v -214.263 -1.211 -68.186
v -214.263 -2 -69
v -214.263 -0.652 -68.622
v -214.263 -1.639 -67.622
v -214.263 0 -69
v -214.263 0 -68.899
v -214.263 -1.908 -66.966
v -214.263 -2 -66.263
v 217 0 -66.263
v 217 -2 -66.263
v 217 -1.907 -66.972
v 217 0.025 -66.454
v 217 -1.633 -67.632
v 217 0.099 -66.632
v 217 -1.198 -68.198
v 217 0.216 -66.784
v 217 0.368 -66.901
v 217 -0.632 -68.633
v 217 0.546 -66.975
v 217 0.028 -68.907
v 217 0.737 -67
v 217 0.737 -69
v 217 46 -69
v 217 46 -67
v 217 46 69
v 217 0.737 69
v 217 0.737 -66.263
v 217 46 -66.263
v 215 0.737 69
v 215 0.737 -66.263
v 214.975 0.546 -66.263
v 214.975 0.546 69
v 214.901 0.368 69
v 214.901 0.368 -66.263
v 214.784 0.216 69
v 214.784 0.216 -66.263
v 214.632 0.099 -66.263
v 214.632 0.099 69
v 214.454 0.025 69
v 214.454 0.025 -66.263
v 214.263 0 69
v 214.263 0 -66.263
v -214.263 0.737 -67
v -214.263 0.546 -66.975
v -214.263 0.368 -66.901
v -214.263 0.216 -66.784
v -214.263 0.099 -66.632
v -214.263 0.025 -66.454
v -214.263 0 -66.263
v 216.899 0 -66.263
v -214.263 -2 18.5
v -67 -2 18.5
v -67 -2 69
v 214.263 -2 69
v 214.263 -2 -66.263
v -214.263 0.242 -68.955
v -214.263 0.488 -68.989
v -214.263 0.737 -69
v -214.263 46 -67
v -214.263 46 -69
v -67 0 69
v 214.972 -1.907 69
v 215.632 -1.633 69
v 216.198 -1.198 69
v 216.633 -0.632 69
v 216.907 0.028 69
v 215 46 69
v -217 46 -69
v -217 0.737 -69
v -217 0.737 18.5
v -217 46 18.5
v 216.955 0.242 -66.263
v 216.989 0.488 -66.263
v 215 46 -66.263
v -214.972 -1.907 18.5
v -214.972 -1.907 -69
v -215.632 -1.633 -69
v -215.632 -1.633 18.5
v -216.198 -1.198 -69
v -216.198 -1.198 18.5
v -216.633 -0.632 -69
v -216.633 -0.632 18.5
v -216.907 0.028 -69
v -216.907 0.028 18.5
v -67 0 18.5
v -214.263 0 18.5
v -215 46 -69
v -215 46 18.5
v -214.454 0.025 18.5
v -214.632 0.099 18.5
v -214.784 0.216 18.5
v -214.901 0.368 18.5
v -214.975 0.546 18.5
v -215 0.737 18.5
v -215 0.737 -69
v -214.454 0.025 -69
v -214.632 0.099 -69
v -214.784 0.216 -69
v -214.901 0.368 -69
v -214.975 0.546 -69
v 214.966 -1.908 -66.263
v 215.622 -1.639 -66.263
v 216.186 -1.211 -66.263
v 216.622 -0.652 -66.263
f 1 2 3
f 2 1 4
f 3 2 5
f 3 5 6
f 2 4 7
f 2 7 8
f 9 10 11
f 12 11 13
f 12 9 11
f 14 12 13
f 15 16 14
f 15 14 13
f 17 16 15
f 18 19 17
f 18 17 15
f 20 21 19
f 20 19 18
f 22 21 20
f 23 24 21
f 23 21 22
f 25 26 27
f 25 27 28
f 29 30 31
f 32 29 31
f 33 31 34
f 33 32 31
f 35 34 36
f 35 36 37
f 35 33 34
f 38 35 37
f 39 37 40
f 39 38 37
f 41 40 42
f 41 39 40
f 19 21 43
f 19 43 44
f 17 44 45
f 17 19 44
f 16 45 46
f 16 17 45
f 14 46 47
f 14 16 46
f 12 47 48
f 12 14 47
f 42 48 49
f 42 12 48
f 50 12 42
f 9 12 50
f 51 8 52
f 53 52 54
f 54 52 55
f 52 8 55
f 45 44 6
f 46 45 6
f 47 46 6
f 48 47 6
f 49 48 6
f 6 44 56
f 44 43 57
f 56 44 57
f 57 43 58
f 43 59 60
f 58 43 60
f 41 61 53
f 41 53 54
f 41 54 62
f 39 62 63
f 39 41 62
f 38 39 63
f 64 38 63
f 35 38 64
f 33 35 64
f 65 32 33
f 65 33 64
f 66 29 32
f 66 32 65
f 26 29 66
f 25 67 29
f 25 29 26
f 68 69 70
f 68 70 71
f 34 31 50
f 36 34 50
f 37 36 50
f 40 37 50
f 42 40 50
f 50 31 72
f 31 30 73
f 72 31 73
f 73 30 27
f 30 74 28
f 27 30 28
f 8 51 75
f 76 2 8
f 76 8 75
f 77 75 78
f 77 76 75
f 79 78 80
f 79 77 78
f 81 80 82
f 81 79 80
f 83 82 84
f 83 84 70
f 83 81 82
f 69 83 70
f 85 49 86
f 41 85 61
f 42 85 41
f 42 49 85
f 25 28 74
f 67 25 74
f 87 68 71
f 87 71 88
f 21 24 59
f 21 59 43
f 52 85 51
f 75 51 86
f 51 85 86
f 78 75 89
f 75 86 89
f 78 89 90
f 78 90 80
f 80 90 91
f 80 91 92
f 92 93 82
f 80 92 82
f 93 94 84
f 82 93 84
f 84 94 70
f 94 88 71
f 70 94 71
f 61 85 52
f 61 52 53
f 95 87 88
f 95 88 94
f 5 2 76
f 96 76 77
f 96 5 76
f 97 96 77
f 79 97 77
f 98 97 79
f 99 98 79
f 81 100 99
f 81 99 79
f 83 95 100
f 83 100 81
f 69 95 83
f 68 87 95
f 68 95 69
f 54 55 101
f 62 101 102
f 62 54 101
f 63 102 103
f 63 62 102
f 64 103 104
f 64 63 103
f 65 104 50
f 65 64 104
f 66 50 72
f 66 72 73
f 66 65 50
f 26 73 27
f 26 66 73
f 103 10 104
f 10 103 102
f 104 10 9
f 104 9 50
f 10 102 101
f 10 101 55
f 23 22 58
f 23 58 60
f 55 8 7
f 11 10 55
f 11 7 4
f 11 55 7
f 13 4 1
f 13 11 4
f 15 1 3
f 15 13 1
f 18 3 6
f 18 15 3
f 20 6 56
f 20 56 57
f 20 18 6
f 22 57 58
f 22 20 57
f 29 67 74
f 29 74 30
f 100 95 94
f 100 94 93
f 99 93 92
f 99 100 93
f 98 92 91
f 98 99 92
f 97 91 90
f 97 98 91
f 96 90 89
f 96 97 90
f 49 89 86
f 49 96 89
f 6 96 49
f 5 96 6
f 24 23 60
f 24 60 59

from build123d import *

# Parameters (mm, degrees)
BRIDA_BASE1_DEPTH                = 2
BRIDA_DE_ARISTA1_STRIP_W         = 9.4732
BRIDA_DE_ARISTA1_STRIP_H         = 2
BRIDA_DE_ARISTA1_STRIP_CUT_DEPTH = 87.5
BRIDA_DE_ARISTA1_DEPTH           = 87.5
BRIDA_DE_ARISTA2_STRIP_W         = 9.4732
BRIDA_DE_ARISTA2_STRIP_H         = 2
BRIDA_DE_ARISTA2_STRIP_CUT_DEPTH = 431.2634
BRIDA_DE_ARISTA2_DEPTH           = 431.2634
BRIDA_DE_ARISTA3_STRIP_W         = 9.4732
BRIDA_DE_ARISTA3_STRIP_H         = 2
BRIDA_DE_ARISTA3_STRIP_CUT_DEPTH = 135.2634
BRIDA_DE_ARISTA3_DEPTH           = 135.2634


# Sheet-metal steps are written as plain solids
with BuildPart() as part:
    # Croquis1 → Brida base1 (new body)
    with BuildSketch(Plane(origin=(0, 0, 0), x_dir=(1, 0, 0), z_dir=(0, 1, 0))):
        Polygon((-67, -69), (217, -69), (217, 69), (-217, 69), (-217, -18.5), (-67, -18.5), align=None)
    extrude(amount=-BRIDA_BASE1_DEPTH)

    # Brida de arista1 strip (across the edge) → Brida de arista1 strip cut (cut)
    with BuildSketch(Plane(origin=(-217, 0, -69), x_dir=(1, 0, 0), z_dir=(0, 0, 1))):
        with Locations((-2, -1)):
            Rectangle(BRIDA_DE_ARISTA1_STRIP_W, BRIDA_DE_ARISTA1_STRIP_H)
    extrude(amount=BRIDA_DE_ARISTA1_STRIP_CUT_DEPTH, mode=Mode.SUBTRACT)

    # Brida de arista1 section (across the edge) → Brida de arista1 (add)
    with BuildSketch(Plane(origin=(-217, 0, -69), x_dir=(1, 0, 0), z_dir=(0, 0, 1))):
        with BuildLine():
            Line((0, 0.7366), (0, 46))
            Line((0, 46), (2, 46))
            Line((2, 46), (2, 0.7366))
            ThreePointArc((2, 0.7366), (2.215745145, 0.215745145), (2.7366, 0))
            Line((2.7366, 0), (2.7366, -2))
            ThreePointArc((2.7366, -2), (0.801531583, -1.198468417), (0, 0.7366))
        make_face()
    extrude(amount=BRIDA_DE_ARISTA1_DEPTH)

    # Brida de arista2 strip (across the edge) → Brida de arista2 strip cut (cut)
    with BuildSketch(Plane(origin=(217, 0, -69), x_dir=(0, 0, 1), z_dir=(-1, 0, 0))):
        with Locations((-2, -1)):
            Rectangle(BRIDA_DE_ARISTA2_STRIP_W, BRIDA_DE_ARISTA2_STRIP_H)
    extrude(amount=BRIDA_DE_ARISTA2_STRIP_CUT_DEPTH, mode=Mode.SUBTRACT)

    # Brida de arista2 section (across the edge) → Brida de arista2 (add)
    with BuildSketch(Plane(origin=(217, 0, -69), x_dir=(0, 0, 1), z_dir=(-1, 0, 0))):
        with BuildLine():
            Line((0, 0.7366), (0, 46))
            Line((0, 46), (2, 46))
            Line((2, 46), (2, 0.7366))
            ThreePointArc((2, 0.7366), (2.215745145, 0.215745145), (2.7366, 0))
            Line((2.7366, 0), (2.7366, -2))
            ThreePointArc((2.7366, -2), (0.801531583, -1.198468417), (0, 0.7366))
        make_face()
    extrude(amount=BRIDA_DE_ARISTA2_DEPTH)

    # Brida de arista3 strip (across the edge) → Brida de arista3 strip cut (cut)
    with BuildSketch(Plane(origin=(217, 0, 69), x_dir=(-1, 0, 0), z_dir=(0, 0, -1))):
        with Locations((-2, -1)):
            Rectangle(BRIDA_DE_ARISTA3_STRIP_W, BRIDA_DE_ARISTA3_STRIP_H)
    extrude(amount=BRIDA_DE_ARISTA3_STRIP_CUT_DEPTH, mode=Mode.SUBTRACT)

    # Brida de arista3 section (across the edge) → Brida de arista3 (add)
    with BuildSketch(Plane(origin=(217, 0, 69), x_dir=(-1, 0, 0), z_dir=(0, 0, -1))):
        with BuildLine():
            Line((0, 0.7366), (0, 46))
            Line((0, 46), (2, 46))
            Line((2, 46), (2, 0.7366))
            ThreePointArc((2, 0.7366), (2.215745145, 0.215745145), (2.7366, 0))
            Line((2.7366, 0), (2.7366, -2))
            ThreePointArc((2.7366, -2), (0.801531583, -1.198468417), (0, 0.7366))
        make_face()
    extrude(amount=BRIDA_DE_ARISTA3_DEPTH)


solid = part.part
